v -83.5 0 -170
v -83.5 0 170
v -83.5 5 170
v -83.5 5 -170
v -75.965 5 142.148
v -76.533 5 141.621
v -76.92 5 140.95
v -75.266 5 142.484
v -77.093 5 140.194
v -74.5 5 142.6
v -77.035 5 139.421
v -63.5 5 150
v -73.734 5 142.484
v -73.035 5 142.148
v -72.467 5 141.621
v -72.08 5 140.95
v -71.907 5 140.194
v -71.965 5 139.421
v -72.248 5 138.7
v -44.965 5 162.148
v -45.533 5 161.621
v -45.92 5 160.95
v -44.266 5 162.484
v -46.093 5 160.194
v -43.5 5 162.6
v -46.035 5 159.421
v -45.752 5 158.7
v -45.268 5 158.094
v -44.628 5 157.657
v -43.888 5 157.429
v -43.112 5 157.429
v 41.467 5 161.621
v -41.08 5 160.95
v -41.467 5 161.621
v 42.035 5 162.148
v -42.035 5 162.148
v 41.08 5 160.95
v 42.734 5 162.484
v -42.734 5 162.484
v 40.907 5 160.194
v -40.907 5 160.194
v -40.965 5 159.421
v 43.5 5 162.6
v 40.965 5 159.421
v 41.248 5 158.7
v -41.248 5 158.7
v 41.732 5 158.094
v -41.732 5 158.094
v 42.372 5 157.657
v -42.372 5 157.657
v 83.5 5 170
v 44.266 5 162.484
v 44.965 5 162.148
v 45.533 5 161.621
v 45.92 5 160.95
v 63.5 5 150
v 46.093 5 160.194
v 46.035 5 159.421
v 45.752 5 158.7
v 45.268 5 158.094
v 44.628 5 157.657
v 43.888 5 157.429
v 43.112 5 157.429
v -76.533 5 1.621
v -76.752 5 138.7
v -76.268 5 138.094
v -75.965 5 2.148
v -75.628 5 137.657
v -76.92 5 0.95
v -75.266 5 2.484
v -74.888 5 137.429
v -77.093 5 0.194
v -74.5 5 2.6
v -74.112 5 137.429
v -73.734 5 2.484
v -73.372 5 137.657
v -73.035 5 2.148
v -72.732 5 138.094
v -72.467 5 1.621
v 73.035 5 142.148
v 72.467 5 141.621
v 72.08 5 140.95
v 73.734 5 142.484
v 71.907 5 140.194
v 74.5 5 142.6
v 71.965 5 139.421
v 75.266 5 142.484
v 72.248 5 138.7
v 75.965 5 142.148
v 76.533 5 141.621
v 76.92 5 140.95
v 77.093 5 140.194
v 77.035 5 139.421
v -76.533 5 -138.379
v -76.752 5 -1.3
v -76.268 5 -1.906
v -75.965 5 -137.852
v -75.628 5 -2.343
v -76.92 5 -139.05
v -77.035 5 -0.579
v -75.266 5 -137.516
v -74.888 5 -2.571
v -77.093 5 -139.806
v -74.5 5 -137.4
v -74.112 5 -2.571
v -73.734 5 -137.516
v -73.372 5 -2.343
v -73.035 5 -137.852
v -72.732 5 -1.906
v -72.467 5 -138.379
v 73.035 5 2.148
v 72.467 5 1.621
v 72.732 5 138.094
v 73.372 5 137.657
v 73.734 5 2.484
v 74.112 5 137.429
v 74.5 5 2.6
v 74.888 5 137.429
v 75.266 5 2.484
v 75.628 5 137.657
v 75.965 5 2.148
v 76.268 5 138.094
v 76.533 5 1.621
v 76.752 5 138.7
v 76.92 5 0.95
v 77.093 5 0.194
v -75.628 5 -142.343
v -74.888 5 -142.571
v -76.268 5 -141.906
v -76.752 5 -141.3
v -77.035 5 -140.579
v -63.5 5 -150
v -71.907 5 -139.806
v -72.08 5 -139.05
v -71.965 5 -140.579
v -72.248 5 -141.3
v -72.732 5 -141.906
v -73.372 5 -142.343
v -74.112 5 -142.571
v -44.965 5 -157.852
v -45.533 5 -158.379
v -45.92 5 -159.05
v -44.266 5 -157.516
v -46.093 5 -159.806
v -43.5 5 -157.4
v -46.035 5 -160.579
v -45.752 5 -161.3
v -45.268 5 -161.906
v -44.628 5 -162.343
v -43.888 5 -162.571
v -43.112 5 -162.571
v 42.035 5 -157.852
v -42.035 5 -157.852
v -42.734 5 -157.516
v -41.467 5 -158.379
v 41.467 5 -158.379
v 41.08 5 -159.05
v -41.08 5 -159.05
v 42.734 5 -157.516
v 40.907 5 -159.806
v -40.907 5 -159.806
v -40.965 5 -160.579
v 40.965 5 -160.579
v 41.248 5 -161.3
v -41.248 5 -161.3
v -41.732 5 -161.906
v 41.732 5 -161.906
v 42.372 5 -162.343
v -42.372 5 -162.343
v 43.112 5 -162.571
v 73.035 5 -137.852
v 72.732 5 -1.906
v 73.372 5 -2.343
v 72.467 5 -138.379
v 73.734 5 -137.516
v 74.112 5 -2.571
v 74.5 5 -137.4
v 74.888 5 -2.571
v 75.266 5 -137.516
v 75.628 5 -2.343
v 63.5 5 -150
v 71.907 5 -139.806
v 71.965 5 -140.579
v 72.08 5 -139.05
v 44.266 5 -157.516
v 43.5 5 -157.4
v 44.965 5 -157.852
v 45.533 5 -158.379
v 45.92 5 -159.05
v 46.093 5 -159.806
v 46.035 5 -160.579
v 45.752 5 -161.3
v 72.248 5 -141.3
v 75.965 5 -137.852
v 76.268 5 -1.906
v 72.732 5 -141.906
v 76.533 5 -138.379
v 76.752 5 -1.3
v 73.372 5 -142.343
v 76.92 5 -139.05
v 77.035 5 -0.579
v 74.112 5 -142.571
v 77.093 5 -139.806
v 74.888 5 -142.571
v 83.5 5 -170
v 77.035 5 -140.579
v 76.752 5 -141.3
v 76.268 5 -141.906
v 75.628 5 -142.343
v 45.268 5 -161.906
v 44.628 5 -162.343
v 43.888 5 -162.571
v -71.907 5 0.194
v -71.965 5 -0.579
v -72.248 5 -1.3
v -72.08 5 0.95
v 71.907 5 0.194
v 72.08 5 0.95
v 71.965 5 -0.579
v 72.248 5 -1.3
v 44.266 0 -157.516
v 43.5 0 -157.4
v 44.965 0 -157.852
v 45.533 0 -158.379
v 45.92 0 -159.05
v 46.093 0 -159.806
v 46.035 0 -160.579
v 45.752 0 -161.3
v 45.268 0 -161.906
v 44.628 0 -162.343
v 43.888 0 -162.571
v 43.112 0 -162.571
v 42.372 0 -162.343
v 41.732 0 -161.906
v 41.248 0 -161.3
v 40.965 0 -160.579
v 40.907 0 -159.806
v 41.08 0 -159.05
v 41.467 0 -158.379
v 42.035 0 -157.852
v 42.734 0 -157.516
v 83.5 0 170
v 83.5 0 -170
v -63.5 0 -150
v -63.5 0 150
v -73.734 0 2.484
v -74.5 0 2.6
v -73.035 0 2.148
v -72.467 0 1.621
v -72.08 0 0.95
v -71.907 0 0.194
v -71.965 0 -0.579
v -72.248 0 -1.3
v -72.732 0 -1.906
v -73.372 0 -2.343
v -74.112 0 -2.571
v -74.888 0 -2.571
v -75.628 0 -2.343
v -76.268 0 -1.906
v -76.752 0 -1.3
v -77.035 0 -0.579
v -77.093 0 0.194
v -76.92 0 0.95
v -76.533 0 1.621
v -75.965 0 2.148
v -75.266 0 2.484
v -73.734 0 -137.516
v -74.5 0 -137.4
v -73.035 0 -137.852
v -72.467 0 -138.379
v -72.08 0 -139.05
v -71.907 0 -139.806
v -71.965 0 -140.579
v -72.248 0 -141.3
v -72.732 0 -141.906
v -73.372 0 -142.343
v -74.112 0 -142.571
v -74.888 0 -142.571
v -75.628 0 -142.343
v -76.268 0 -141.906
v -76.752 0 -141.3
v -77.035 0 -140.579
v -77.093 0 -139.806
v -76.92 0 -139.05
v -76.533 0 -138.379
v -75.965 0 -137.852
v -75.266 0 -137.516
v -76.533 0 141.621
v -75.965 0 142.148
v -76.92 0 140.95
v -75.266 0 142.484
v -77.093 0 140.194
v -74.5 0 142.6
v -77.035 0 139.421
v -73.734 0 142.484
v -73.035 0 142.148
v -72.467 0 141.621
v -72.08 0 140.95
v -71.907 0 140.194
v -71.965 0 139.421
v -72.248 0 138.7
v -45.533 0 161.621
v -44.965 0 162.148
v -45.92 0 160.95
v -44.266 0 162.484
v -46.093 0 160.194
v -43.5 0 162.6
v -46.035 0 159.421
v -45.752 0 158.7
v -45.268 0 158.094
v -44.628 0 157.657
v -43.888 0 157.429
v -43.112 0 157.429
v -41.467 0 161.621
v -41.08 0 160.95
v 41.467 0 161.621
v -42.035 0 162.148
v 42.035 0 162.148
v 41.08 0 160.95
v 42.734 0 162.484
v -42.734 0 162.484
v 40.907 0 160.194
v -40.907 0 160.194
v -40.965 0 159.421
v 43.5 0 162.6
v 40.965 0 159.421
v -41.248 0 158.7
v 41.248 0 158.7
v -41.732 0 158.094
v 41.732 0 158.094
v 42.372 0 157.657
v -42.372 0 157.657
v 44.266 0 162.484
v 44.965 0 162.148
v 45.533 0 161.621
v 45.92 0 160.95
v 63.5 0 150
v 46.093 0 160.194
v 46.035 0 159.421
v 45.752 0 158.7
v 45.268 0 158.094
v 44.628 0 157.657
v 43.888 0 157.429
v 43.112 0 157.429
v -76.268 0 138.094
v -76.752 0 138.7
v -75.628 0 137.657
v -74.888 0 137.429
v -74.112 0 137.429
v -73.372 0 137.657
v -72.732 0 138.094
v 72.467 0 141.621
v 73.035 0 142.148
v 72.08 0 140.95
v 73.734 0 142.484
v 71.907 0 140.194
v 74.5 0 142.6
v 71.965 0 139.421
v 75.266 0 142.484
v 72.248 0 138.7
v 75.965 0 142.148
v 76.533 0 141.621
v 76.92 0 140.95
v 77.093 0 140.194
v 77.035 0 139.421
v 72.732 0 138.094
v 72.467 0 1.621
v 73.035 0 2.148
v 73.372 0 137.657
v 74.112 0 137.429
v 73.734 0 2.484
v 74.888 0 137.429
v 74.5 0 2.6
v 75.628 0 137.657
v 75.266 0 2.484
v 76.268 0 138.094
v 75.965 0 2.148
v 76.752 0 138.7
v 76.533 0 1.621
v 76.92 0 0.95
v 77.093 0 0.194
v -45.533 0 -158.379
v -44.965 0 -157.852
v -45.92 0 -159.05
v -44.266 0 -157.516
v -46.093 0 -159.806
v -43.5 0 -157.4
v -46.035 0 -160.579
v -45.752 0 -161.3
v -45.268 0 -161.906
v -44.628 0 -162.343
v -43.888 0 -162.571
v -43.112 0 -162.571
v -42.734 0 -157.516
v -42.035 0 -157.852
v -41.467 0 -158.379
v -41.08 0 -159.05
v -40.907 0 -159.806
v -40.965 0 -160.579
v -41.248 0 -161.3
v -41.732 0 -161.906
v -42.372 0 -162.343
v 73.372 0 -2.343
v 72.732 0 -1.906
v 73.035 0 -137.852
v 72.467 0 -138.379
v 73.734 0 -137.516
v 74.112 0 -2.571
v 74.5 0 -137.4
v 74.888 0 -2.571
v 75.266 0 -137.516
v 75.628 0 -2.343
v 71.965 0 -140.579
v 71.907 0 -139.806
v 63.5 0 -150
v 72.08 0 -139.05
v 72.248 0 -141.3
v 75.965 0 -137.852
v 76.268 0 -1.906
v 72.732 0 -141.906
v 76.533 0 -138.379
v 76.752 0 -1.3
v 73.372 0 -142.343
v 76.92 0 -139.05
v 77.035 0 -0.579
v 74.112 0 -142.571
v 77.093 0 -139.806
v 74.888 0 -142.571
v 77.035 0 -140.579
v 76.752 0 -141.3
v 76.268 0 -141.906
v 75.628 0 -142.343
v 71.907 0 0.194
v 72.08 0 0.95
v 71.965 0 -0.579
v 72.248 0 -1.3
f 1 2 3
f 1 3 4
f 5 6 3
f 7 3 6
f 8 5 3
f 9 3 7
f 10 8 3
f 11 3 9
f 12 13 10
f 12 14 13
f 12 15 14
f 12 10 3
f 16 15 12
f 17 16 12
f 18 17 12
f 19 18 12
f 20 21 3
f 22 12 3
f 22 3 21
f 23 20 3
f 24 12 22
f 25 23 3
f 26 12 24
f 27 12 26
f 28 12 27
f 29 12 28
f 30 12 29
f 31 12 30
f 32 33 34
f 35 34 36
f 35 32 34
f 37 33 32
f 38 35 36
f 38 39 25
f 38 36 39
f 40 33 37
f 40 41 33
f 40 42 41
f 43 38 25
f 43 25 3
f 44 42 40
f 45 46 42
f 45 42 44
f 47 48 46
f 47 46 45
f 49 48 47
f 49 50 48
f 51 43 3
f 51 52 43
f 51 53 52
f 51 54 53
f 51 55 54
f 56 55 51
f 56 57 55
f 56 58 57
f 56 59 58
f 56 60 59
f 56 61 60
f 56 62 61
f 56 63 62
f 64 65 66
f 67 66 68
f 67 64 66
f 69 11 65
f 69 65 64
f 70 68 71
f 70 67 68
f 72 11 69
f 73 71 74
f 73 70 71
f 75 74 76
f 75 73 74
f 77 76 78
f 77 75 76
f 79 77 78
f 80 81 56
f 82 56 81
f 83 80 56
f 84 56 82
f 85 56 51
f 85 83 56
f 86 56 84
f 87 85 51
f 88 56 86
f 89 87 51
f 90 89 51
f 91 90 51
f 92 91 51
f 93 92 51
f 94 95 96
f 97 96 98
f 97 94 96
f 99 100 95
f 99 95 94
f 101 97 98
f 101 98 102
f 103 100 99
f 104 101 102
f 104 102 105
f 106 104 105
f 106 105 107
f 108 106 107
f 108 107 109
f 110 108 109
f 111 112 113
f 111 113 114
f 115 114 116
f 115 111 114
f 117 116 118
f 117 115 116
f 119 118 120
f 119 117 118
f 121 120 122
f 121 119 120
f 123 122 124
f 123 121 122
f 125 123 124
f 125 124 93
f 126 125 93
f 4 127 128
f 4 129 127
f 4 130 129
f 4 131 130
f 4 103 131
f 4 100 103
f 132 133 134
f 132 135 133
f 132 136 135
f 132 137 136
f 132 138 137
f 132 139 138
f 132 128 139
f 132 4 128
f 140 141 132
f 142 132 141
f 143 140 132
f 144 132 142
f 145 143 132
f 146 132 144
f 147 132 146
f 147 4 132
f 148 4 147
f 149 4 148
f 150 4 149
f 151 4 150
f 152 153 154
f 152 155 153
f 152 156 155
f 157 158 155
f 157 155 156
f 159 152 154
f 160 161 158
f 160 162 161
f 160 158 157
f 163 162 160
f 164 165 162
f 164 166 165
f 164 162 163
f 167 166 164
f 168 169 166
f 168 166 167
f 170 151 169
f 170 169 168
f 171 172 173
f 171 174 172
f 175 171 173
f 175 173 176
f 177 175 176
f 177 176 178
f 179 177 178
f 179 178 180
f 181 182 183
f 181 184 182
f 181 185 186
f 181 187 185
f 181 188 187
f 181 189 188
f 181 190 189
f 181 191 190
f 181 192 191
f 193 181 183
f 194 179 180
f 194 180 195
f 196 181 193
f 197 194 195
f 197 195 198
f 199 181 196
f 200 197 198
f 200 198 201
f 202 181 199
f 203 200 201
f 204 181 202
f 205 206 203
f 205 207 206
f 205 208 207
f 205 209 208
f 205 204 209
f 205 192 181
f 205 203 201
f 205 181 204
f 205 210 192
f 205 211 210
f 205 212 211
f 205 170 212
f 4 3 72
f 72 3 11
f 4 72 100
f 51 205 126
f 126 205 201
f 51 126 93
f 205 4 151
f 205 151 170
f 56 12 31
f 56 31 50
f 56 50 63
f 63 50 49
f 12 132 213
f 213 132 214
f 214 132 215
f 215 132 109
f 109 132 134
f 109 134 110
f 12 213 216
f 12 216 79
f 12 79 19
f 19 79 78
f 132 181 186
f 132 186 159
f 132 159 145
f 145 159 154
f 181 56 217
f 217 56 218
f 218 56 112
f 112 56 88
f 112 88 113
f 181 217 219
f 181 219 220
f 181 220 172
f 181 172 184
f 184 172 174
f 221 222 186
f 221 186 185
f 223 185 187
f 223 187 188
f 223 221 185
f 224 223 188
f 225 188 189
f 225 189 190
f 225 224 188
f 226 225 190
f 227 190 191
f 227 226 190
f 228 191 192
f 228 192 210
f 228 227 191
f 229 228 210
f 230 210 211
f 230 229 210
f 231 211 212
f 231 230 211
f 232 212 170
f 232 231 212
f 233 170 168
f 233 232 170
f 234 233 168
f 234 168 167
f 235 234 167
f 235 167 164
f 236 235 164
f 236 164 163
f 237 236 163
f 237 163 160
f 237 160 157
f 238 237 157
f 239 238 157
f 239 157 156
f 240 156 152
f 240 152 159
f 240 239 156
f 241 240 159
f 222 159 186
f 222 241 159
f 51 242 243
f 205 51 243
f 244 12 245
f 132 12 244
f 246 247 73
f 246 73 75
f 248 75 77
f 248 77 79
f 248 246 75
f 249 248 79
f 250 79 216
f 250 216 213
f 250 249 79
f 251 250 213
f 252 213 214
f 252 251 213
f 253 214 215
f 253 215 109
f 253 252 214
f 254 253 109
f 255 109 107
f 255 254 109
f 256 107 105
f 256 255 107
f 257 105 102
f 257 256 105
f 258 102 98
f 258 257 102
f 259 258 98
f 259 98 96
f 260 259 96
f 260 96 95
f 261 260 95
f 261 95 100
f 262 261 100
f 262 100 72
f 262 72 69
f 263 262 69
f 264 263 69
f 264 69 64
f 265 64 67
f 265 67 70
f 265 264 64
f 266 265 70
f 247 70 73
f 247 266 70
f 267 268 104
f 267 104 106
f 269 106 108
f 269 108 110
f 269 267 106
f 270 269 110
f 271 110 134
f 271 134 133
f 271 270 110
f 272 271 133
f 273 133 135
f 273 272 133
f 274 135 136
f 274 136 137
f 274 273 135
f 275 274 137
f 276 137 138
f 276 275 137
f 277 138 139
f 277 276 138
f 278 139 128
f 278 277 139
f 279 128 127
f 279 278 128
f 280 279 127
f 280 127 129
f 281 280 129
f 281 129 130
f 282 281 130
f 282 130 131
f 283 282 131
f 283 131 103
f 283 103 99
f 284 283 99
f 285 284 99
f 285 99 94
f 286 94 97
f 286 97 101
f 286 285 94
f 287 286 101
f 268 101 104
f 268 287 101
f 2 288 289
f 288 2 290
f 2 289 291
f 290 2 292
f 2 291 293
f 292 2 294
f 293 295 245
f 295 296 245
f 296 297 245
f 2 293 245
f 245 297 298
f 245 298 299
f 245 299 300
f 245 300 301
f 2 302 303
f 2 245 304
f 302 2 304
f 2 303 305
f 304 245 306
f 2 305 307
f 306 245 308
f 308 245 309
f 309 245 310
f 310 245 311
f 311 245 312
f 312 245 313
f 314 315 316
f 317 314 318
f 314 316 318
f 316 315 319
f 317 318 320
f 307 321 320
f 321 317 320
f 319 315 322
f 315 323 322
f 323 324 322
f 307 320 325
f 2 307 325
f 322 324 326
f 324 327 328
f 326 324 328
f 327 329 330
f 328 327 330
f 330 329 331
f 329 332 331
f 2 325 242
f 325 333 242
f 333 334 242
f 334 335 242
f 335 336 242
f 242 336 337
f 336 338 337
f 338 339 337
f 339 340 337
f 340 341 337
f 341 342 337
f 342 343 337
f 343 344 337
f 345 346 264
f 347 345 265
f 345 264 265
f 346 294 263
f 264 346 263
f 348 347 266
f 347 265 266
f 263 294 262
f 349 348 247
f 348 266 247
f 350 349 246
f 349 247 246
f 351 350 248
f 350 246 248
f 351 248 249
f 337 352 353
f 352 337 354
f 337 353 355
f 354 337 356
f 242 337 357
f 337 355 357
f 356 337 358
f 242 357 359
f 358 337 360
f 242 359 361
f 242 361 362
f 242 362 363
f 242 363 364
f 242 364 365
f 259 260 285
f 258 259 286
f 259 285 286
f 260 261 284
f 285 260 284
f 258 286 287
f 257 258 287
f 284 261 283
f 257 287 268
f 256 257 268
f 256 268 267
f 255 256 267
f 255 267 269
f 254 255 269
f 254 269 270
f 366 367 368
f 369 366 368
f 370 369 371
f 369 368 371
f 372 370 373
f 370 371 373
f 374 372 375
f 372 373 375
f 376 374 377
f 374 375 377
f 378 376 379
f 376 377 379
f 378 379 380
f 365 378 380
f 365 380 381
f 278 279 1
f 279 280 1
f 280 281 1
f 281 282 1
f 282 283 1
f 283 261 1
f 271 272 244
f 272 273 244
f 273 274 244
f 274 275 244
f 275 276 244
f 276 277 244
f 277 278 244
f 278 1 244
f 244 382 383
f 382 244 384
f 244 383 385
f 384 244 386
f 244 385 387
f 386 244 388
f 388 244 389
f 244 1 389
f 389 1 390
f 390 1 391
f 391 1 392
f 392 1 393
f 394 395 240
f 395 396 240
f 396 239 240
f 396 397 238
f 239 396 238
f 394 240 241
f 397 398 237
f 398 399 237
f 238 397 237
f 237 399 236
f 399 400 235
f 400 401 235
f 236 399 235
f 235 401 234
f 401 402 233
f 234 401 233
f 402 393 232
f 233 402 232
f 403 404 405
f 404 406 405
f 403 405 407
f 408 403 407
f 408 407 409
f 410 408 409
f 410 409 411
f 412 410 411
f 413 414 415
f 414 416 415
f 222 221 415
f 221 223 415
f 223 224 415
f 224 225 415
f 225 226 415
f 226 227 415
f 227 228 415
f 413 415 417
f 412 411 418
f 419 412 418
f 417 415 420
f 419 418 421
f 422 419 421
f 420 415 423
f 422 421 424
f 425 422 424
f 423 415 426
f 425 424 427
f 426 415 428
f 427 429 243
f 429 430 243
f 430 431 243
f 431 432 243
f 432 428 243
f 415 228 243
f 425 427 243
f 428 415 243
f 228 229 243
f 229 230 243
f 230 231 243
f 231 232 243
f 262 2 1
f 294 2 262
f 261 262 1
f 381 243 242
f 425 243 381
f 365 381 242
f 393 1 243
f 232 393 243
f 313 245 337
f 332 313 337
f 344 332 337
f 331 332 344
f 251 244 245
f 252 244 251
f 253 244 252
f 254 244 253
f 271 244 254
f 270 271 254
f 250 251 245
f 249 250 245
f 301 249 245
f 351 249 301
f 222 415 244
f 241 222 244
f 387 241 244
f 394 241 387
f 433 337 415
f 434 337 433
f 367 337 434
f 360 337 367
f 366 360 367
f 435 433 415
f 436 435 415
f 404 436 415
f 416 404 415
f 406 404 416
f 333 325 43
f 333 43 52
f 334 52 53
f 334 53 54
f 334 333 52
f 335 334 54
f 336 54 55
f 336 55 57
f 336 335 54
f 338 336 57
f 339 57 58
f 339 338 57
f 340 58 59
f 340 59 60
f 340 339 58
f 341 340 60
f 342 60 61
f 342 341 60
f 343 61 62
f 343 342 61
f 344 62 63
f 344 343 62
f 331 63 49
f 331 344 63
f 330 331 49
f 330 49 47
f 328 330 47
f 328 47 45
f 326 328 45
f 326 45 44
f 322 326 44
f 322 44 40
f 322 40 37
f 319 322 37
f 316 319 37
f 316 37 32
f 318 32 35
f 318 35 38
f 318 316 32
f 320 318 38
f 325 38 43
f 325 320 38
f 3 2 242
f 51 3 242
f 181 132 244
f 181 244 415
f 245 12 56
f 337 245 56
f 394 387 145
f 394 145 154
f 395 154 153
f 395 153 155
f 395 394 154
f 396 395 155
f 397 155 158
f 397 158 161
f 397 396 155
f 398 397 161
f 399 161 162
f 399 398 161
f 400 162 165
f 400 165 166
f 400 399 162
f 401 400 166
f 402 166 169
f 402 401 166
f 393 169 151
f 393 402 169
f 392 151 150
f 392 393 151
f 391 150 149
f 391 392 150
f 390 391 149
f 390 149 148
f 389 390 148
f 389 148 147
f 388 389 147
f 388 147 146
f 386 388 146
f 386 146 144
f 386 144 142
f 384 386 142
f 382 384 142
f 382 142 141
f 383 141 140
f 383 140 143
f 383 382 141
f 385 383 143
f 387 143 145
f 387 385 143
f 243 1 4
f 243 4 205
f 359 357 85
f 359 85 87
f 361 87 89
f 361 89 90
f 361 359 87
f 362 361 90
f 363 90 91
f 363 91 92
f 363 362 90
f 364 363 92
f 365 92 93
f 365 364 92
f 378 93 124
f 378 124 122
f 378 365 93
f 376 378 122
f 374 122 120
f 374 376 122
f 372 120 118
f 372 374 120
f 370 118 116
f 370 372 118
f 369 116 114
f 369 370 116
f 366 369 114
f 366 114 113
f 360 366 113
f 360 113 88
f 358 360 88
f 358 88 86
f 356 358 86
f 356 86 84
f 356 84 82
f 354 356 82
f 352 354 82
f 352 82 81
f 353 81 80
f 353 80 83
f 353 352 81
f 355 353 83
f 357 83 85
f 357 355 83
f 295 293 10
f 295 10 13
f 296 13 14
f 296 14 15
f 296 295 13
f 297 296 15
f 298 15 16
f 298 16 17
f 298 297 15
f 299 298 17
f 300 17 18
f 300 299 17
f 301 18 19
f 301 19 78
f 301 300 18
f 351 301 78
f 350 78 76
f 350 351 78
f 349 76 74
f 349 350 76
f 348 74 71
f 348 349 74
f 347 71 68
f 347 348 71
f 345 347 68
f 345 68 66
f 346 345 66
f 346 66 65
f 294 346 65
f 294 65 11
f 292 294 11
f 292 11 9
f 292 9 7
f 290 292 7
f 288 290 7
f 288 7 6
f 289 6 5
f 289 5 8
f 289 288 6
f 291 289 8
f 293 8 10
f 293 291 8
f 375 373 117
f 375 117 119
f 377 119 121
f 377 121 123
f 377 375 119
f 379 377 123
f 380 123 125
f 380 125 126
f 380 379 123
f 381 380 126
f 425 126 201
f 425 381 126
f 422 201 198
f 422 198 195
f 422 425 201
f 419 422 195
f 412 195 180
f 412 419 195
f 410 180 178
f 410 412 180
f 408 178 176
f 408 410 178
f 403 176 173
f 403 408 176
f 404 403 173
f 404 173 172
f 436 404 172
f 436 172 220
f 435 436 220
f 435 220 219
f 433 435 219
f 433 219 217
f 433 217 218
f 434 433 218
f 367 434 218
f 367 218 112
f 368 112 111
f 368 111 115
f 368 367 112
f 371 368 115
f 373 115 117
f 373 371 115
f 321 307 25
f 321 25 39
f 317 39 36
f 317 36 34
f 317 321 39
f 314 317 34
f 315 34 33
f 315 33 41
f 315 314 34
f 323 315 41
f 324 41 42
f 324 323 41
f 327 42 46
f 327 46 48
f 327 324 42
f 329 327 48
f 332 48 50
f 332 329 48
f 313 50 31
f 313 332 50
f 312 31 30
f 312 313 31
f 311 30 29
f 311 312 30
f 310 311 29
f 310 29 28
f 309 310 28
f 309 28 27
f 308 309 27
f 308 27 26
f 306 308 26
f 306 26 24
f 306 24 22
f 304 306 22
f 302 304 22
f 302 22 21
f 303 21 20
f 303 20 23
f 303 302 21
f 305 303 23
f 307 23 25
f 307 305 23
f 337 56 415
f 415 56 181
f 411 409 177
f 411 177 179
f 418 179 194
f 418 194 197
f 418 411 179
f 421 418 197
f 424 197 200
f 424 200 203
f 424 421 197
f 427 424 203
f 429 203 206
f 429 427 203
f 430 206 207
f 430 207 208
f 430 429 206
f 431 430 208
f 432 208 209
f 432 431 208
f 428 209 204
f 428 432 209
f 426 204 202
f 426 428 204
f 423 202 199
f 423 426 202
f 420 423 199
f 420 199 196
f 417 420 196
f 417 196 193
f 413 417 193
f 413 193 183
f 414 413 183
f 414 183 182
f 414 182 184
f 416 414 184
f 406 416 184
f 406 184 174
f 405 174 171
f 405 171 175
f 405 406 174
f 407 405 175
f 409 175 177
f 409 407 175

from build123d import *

# Parameters (mm, degrees)
CROQUIS1_W              = 167
CROQUIS1_H              = 340
CROQUIS1_R              = 2.6
SALIENTE_EXTRUIR1_DEPTH = 5
SKETCH1_W               = 127
SKETCH1_H               = 300
CUT_EXTRUDE1_DEPTH      = 10


with BuildPart() as part:
    # Croquis1 → Saliente-Extruir1 (new body)
    with BuildSketch(Plane(origin=(0, 0, 0), x_dir=(1, 0, 0), z_dir=(0, 1, 0))):
        Rectangle(CROQUIS1_W, CROQUIS1_H)
        with Locations(Location((-74.5, 140, 0), (0, 0, 270))):
            Circle(CROQUIS1_R, mode=Mode.SUBTRACT)
        with Locations(Location((-74.5, 0, 0), (0, 0, 270))):
            Circle(CROQUIS1_R, mode=Mode.SUBTRACT)
        with Locations(Location((-74.5, -140, 0), (0, 0, 270))):
            Circle(CROQUIS1_R, mode=Mode.SUBTRACT)
        with Locations(Location((74.5, 140, 0), (0, 0, 270))):
            Circle(CROQUIS1_R, mode=Mode.SUBTRACT)
        with Locations(Location((74.5, -140, 0), (0, 0, 270))):
            Circle(CROQUIS1_R, mode=Mode.SUBTRACT)
        with Locations(Location((74.5, 0, 0), (0, 0, 270))):
            Circle(CROQUIS1_R, mode=Mode.SUBTRACT)
        with Locations(Location((-43.5, 160, 0), (0, 0, 270))):
            Circle(CROQUIS1_R, mode=Mode.SUBTRACT)
        with Locations(Location((43.5, 160, 0), (0, 0, 270))):
            Circle(CROQUIS1_R, mode=Mode.SUBTRACT)
        with Locations(Location((-43.5, -160, 0), (0, 0, 270))):
            Circle(CROQUIS1_R, mode=Mode.SUBTRACT)
        with Locations(Location((43.5, -160, 0), (0, 0, 270))):
            Circle(CROQUIS1_R, mode=Mode.SUBTRACT)
    extrude(amount=SALIENTE_EXTRUIR1_DEPTH)

    # Sketch1 → Cut-Extrude1 (cut)
    with BuildSketch(Plane(origin=(0, 5, 0), x_dir=(1, 0, 0), z_dir=(0, 1, 0))):
        Rectangle(SKETCH1_W, SKETCH1_H)
    extrude(amount=-CUT_EXTRUDE1_DEPTH, mode=Mode.SUBTRACT)


solid = part.part
